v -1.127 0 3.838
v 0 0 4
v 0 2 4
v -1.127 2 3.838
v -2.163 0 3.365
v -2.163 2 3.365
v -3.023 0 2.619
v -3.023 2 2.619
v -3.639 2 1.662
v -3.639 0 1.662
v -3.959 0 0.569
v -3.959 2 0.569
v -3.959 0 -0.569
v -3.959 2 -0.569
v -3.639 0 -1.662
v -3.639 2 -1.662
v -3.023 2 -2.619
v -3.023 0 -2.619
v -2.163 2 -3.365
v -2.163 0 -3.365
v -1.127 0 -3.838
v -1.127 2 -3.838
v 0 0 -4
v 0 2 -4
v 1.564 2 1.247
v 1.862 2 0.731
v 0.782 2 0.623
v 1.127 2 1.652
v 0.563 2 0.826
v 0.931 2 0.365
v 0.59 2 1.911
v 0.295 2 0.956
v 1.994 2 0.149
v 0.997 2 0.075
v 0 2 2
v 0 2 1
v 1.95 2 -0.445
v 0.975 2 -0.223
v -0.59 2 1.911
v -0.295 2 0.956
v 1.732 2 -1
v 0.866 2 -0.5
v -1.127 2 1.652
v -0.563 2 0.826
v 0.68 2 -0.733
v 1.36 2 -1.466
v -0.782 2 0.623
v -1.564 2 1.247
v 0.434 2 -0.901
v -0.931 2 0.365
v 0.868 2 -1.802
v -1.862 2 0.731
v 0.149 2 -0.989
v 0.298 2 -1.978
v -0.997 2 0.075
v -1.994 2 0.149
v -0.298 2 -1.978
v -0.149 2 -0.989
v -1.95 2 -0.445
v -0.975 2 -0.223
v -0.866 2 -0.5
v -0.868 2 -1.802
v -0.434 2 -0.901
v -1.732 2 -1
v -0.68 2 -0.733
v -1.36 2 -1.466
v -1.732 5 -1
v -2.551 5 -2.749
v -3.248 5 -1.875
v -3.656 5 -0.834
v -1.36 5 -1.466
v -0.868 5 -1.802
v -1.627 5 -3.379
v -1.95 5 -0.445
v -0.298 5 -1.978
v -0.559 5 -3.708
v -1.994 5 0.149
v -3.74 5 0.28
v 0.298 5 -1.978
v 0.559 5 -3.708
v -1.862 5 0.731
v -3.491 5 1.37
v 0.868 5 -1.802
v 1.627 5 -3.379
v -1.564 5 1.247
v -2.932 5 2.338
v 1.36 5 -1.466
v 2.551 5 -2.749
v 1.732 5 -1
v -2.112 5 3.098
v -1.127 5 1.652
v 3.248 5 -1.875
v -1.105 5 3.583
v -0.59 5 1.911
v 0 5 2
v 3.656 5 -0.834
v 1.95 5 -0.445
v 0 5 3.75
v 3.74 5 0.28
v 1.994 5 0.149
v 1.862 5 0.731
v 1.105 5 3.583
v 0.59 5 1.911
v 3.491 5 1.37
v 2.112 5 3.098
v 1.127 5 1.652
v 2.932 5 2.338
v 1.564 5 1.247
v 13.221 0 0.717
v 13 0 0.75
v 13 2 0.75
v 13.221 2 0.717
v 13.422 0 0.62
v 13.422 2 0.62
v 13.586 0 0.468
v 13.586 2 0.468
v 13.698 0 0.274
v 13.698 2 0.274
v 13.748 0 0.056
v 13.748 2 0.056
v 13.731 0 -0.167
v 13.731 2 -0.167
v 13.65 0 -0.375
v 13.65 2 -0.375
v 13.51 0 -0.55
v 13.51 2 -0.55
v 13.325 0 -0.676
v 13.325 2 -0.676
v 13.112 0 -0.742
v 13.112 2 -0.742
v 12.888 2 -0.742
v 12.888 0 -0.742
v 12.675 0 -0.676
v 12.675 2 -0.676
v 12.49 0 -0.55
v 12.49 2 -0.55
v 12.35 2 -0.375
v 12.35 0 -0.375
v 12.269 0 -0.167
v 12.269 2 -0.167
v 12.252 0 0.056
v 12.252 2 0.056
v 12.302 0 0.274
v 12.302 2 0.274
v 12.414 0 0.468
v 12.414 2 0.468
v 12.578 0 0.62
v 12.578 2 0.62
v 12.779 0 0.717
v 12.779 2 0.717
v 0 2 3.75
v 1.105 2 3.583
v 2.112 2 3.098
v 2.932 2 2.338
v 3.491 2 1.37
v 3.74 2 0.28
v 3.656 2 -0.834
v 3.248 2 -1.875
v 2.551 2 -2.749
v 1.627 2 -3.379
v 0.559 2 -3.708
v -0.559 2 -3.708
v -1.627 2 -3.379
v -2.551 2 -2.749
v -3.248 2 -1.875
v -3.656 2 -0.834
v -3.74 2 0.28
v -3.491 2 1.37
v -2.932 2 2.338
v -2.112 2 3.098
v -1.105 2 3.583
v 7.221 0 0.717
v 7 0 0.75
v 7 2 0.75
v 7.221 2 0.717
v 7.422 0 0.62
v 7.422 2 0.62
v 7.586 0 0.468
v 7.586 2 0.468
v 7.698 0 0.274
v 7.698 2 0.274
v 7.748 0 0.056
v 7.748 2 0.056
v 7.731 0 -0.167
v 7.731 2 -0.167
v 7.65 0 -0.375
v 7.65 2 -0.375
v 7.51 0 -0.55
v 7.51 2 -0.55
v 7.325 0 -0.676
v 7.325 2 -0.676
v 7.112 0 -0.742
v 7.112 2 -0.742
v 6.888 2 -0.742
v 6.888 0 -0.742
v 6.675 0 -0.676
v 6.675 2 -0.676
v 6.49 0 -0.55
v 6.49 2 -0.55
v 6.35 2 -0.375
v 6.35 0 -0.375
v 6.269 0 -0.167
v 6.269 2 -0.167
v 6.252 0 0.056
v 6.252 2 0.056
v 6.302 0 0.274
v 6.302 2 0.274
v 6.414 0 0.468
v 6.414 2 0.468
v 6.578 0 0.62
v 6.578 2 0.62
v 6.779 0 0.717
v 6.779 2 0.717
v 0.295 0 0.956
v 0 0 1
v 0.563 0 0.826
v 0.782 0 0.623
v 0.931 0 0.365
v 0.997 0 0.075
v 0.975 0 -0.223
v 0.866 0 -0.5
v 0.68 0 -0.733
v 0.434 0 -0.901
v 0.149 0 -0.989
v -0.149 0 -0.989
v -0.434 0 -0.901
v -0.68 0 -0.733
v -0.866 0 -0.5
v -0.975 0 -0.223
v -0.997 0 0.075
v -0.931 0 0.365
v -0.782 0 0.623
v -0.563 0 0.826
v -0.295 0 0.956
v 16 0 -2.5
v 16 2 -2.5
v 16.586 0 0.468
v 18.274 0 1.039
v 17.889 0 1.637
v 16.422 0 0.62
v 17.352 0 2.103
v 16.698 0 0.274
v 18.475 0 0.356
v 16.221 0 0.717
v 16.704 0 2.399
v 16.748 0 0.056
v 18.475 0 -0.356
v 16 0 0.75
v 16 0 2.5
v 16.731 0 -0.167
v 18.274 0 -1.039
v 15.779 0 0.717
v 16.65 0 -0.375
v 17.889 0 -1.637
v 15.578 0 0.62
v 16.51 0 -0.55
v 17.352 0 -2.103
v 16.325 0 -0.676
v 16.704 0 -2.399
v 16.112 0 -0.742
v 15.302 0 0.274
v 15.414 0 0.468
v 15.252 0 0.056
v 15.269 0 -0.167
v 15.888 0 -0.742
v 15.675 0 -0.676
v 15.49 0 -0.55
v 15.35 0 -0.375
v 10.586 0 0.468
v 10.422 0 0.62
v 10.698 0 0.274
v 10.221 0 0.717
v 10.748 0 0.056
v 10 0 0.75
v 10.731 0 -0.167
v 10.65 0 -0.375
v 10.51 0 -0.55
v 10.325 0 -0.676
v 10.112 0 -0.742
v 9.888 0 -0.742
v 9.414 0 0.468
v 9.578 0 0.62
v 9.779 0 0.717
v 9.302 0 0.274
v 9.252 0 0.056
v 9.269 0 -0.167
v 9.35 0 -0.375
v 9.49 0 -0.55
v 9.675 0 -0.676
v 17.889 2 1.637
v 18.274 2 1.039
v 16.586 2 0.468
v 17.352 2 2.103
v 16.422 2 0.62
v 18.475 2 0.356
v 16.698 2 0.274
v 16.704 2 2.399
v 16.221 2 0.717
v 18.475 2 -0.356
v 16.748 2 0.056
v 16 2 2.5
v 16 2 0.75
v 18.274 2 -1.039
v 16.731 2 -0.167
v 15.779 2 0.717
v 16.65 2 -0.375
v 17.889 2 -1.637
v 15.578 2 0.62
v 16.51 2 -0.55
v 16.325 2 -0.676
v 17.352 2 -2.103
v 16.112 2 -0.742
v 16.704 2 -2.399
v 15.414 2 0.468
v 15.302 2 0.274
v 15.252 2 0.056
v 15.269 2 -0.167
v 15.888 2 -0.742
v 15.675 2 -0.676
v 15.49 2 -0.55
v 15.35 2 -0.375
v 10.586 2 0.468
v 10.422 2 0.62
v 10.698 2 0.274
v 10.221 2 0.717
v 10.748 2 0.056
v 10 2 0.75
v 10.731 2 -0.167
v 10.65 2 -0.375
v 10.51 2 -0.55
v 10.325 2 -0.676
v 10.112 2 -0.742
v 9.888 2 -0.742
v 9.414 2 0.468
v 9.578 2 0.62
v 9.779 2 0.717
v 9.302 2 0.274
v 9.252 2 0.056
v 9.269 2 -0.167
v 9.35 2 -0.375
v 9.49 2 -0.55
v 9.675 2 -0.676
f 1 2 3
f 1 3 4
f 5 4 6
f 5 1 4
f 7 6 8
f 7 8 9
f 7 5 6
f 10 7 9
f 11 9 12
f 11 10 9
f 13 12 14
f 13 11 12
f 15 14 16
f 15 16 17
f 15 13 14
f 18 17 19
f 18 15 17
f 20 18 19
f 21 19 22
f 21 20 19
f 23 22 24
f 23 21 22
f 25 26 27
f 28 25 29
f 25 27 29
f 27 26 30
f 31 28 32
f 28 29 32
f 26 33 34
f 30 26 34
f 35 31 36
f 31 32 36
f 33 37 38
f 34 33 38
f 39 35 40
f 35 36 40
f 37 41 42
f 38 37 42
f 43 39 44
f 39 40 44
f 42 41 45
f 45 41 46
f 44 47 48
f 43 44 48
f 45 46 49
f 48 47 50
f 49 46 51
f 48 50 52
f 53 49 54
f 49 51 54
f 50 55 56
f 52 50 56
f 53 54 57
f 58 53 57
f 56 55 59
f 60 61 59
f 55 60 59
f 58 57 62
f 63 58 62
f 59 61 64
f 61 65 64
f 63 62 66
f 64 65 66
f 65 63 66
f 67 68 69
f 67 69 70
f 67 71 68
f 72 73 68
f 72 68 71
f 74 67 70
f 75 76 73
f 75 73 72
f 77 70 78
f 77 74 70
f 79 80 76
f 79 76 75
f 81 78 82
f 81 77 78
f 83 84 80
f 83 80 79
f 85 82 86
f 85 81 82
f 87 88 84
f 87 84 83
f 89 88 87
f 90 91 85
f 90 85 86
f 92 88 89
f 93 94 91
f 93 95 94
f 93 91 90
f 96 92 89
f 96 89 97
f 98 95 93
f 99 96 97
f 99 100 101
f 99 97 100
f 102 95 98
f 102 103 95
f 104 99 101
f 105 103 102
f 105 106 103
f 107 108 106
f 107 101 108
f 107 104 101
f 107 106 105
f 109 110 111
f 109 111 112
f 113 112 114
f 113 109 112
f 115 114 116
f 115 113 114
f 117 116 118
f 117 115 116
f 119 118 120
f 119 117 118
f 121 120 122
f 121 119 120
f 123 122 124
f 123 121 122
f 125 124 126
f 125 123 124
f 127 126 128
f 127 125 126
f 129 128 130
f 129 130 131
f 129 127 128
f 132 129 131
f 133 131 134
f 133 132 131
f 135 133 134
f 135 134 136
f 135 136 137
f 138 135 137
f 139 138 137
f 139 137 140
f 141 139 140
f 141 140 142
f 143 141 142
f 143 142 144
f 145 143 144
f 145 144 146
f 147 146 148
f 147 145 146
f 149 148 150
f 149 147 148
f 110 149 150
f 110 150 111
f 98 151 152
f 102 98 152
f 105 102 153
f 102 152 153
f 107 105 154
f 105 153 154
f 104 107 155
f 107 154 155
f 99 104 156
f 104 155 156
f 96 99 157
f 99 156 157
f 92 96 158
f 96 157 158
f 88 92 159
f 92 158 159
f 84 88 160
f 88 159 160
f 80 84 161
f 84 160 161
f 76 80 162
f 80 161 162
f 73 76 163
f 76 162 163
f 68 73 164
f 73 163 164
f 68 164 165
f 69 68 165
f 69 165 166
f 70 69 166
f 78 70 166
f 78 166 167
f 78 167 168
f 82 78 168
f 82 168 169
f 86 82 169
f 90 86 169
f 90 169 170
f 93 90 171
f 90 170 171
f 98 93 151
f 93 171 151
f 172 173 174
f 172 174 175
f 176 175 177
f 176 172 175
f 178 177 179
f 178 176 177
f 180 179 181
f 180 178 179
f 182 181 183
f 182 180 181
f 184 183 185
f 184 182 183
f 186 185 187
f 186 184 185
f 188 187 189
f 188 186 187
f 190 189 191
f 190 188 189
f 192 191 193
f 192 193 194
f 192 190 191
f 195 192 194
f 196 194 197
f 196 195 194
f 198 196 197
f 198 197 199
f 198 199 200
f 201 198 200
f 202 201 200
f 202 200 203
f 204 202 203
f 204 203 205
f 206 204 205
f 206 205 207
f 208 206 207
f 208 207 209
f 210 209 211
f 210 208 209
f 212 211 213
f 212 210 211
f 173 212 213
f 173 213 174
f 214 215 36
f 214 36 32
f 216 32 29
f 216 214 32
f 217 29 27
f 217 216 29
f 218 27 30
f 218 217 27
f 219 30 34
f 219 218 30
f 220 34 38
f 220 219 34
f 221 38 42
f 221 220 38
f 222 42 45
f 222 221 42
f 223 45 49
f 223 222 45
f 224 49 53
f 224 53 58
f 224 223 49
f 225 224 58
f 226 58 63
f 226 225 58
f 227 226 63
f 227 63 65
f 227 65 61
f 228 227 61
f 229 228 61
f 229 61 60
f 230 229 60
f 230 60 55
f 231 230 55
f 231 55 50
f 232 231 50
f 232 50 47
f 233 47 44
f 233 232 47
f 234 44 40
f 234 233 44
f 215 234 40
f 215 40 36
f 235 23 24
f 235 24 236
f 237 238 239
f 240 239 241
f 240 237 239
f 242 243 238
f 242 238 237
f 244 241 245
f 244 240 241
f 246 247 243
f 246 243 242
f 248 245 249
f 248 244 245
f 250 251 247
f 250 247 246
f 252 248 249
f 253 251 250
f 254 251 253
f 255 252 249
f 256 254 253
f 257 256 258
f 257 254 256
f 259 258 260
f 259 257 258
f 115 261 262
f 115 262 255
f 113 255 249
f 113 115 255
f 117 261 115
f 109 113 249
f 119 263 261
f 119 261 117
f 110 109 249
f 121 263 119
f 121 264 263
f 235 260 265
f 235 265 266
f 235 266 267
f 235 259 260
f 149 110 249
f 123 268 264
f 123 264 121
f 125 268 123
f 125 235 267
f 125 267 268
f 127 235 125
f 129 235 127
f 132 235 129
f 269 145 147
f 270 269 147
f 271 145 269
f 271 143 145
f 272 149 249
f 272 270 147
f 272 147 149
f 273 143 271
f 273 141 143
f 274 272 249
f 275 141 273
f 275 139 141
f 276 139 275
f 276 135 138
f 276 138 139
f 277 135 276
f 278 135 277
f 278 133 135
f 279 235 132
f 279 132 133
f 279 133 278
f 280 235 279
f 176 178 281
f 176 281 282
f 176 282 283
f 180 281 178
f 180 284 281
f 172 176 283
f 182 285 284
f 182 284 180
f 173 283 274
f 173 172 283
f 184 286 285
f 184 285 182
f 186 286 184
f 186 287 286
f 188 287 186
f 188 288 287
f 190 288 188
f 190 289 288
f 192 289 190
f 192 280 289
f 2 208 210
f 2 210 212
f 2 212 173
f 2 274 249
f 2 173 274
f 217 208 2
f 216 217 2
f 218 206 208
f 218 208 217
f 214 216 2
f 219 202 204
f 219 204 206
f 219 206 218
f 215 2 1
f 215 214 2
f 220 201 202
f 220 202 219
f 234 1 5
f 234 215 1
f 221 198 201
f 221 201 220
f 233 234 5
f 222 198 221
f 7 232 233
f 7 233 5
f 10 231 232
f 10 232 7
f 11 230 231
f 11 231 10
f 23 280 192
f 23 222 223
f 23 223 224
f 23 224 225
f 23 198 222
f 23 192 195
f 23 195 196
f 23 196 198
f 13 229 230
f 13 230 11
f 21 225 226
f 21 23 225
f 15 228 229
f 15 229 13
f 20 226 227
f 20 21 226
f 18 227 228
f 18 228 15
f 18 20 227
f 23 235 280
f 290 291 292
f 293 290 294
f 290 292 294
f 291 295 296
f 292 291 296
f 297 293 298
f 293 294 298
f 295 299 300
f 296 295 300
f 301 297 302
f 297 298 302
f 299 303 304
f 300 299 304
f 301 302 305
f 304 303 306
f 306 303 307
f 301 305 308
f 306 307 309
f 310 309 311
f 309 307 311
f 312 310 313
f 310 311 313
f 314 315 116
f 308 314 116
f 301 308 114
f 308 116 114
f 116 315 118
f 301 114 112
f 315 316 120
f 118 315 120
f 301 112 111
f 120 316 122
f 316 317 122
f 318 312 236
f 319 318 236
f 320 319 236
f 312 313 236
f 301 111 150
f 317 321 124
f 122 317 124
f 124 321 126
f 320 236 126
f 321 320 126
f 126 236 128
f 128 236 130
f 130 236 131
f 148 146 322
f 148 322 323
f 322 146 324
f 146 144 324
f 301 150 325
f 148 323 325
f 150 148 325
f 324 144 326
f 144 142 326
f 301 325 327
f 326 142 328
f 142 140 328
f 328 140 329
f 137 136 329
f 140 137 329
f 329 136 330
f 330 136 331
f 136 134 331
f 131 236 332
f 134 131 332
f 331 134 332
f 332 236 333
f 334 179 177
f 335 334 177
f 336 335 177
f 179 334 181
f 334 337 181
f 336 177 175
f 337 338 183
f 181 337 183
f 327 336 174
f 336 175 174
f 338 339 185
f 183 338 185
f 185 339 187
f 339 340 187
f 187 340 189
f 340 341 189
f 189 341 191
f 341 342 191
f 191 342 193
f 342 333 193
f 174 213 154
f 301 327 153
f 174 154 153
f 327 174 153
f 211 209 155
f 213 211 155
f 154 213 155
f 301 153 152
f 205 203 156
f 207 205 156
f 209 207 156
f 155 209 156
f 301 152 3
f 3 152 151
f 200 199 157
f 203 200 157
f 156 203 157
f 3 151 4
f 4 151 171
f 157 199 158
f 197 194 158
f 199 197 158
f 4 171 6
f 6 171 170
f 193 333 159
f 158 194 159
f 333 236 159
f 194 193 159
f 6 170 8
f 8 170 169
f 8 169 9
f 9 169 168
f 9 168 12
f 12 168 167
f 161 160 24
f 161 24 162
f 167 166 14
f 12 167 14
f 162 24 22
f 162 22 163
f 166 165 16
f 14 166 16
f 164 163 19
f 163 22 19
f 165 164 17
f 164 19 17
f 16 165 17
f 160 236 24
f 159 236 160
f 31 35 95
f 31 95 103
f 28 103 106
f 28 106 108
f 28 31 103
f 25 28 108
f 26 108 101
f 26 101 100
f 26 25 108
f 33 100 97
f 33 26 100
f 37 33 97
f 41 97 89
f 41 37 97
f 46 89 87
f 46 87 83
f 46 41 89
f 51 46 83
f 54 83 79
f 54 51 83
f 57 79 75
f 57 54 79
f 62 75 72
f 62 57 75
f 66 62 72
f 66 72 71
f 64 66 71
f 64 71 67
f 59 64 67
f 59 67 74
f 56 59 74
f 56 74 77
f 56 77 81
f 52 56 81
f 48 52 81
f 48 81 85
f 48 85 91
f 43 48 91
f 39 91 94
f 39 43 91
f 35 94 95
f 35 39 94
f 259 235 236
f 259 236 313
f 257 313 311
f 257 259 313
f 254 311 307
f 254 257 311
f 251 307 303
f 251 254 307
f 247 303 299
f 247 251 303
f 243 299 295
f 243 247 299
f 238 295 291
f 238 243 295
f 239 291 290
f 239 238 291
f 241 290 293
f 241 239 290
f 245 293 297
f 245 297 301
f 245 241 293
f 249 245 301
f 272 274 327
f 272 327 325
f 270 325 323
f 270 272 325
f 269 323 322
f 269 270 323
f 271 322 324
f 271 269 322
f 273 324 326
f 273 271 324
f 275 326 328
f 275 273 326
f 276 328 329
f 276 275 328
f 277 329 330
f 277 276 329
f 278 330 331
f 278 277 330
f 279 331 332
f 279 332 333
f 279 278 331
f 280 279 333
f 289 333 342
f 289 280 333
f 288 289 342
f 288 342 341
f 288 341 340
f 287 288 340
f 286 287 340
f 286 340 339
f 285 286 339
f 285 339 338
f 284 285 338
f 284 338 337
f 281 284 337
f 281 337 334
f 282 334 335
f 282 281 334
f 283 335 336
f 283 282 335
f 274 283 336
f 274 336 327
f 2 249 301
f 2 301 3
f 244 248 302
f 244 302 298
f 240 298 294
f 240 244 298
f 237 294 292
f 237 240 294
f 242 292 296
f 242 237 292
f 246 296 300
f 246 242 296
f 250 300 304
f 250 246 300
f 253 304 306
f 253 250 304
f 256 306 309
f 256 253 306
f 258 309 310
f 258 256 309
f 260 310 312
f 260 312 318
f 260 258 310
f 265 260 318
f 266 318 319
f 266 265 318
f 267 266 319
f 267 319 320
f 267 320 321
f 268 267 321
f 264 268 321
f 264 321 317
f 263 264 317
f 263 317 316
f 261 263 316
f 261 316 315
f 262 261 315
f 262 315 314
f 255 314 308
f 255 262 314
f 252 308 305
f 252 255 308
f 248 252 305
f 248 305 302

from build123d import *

# Parameters (mm, degrees)
ESQUISSE1_R        = 0.75
ESQUISSE1_R_2      = 1
BOSS_EXTRU_1_DEPTH = 2
ESQUISSE2_R        = 3.75
ESQUISSE2_R_2      = 2
BOSS_EXTRU_2_DEPTH = 3


with BuildPart() as part:
    # Esquisse1 → Boss.-Extru.1 (new body)
    with BuildSketch(Plane(origin=(0, 0, 0), x_dir=(1, 0, 0), z_dir=(0, 1, 0))):
        with BuildLine():
            Line((0, 4), (16, 2.5))
            ThreePointArc((16, 2.5), (18.5, 0), (16, -2.5))
            Line((16, -2.5), (0, -4))
            ThreePointArc((0, -4), (-4, 0), (0, 4))
        make_face()
        with Locations(Location((16, 0, 0), (0, 0, 270))):
            Circle(ESQUISSE1_R, mode=Mode.SUBTRACT)
        with Locations(Location((13, 0, 0), (0, 0, 270))):
            Circle(ESQUISSE1_R, mode=Mode.SUBTRACT)
        with Locations(Location((10, 0, 0), (0, 0, 270))):
            Circle(ESQUISSE1_R, mode=Mode.SUBTRACT)
        with Locations(Location((7, 0, 0), (0, 0, 270))):
            Circle(ESQUISSE1_R, mode=Mode.SUBTRACT)
        with Locations(Location((0, 0, 0), (0, 0, 270))):
            Circle(ESQUISSE1_R_2, mode=Mode.SUBTRACT)
    extrude(amount=BOSS_EXTRU_1_DEPTH)

    # Esquisse2 → Boss.-Extru.2 (add)
    with BuildSketch(Plane(origin=(0, 2, 0), x_dir=(1, 0, 0), z_dir=(0, 1, 0))):
        with Locations(Location((0, 0, 0), (0, 0, 270))):
            Circle(ESQUISSE2_R)
        with Locations(Location((0, 0, 0), (0, 0, 270))):
            Circle(ESQUISSE2_R_2, mode=Mode.SUBTRACT)
    extrude(amount=BOSS_EXTRU_2_DEPTH)


solid = part.part
